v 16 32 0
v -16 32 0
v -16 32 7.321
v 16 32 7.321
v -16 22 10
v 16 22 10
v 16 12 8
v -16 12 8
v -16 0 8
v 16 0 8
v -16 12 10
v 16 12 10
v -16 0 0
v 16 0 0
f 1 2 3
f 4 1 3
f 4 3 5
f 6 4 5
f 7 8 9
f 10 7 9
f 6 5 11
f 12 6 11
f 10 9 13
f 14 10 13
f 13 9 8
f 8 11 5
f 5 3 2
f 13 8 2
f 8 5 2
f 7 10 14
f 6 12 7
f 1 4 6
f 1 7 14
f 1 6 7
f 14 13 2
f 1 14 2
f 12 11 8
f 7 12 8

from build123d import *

# Parameters (mm, degrees)
SALIENTE_EXTRUIR1_DEPTH      = 16
SALIENTE_EXTRUIR1_DEPTH_BACK = 16


with BuildPart() as part:
    # Croquis1 → Saliente-Extruir1 (new, two sides: drawn at the far end of the back side and taken through both)
    with BuildSketch(Plane(origin=(0, 0, 0), x_dir=(0, 0, -1), z_dir=(1, 0, 0)).offset(-SALIENTE_EXTRUIR1_DEPTH_BACK)):
        Polygon((0, 0), (0, 32), (-7.320508076, 32), (-10, 22), (-10, 12), (-8, 12), (-8, 0), align=None)
    extrude(amount=SALIENTE_EXTRUIR1_DEPTH + SALIENTE_EXTRUIR1_DEPTH_BACK)


solid = part.part
